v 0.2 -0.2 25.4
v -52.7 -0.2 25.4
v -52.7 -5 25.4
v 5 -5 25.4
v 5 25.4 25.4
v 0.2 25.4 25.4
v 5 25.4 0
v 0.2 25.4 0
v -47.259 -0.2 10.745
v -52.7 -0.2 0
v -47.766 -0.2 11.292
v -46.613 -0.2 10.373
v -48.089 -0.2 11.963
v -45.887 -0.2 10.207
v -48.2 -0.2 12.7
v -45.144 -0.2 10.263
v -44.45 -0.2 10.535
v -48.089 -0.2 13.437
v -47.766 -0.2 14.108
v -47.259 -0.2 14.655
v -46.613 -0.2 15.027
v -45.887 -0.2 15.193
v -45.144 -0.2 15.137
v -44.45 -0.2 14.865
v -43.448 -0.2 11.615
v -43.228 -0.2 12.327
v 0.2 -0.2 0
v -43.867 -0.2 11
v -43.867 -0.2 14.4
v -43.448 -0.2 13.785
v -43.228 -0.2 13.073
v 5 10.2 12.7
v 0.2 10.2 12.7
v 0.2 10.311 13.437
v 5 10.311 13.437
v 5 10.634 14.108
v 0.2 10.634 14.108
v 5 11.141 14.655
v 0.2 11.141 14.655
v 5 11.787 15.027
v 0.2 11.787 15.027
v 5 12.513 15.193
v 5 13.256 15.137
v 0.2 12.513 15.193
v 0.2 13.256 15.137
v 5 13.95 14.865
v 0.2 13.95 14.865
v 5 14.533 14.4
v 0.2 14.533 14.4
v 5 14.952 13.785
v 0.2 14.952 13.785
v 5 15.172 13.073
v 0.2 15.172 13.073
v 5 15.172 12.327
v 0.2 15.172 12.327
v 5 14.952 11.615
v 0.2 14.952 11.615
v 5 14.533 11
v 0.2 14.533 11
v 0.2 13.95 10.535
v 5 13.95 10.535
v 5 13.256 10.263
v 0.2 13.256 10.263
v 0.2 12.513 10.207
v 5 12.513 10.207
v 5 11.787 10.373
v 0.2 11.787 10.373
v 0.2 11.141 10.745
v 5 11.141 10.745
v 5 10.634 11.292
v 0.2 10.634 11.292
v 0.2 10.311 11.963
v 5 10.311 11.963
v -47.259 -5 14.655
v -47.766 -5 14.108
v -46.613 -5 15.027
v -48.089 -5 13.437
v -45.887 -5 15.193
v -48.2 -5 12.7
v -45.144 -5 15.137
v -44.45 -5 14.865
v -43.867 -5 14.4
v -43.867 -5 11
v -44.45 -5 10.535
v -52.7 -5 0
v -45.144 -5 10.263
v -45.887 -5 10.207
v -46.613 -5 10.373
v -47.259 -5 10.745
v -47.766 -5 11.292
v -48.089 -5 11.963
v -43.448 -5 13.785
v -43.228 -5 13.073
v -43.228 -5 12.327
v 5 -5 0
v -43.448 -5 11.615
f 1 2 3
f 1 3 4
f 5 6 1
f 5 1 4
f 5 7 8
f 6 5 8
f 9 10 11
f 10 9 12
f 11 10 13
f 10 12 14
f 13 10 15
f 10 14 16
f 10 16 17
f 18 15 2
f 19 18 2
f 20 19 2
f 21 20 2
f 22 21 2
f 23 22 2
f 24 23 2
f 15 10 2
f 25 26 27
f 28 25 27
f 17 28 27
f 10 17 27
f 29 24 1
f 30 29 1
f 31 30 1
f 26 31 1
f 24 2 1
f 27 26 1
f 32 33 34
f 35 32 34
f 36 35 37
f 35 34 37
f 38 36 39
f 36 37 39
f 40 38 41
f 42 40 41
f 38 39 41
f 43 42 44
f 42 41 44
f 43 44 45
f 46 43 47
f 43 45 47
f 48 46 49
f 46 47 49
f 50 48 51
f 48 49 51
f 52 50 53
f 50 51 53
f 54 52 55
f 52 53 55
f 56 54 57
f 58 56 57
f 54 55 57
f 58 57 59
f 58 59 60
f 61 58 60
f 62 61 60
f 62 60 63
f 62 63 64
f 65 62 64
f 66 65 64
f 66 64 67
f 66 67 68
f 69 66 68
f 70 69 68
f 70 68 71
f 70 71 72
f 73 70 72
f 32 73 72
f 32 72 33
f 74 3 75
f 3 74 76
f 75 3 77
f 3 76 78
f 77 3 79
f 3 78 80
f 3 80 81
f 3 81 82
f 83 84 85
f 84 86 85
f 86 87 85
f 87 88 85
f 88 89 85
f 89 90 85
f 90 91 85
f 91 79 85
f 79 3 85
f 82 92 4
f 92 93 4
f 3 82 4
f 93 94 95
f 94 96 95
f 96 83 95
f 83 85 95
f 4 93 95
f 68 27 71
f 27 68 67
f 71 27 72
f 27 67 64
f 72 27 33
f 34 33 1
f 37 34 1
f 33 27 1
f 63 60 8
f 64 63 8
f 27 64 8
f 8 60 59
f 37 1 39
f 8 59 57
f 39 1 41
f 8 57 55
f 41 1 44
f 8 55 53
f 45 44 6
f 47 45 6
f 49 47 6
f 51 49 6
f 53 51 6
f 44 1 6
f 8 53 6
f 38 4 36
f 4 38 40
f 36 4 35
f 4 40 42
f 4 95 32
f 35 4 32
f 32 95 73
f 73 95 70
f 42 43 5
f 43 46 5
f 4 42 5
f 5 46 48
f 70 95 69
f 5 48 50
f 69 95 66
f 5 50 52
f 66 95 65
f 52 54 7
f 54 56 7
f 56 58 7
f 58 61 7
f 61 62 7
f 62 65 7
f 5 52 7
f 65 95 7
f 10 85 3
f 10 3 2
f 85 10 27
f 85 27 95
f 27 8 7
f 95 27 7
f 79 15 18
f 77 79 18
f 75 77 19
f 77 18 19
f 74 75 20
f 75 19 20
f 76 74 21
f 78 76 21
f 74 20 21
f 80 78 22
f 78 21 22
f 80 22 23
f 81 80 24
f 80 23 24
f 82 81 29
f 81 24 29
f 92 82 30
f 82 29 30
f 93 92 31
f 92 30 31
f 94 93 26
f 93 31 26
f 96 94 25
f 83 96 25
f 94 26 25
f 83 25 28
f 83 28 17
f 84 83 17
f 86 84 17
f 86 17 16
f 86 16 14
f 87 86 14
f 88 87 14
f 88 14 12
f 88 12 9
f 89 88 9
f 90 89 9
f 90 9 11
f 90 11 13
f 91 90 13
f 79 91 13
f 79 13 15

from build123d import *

# Parameters (mm, degrees)
F0_W     = 27.3
F0_H     = 5
F1_DEPTH = 25.4
F2_R     = 2.5
F3_DEPTH = 5.001
F4_R     = 2.5
F5_DEPTH = 5.001
F6_W     = 52.7
F6_H     = 0.2
F7_DEPTH = 25.401


with BuildPart() as f1:
    # F0 (on Top) → F1 (new body)
    with BuildSketch(Plane.XY):
        Polygon((5, 25.4), (0, 25.4), (0, 0), (-25.4, 0), (-25.4, -5), (5, -5), (5, 0), align=None)
        with Locations((-39.05, -2.5)):
            Rectangle(F0_W, F0_H)
    extrude(amount=F1_DEPTH)

    # F2 (on face) → F3 (cut, through all)
    with BuildSketch(Plane(origin=(0, 0, 0), x_dir=(0, -1, 0), z_dir=(-1, 0, 0))):
        with Locations((-12.7, 12.7)):
            Circle(F2_R)
    extrude(amount=-F3_DEPTH, mode=Mode.SUBTRACT)

    # F4 (on face) → F5 (cut, through all)
    with BuildSketch(Plane(origin=(0, 0, 0), x_dir=(-1, 0, 0), z_dir=(0, 1, 0))):
        with Locations((45.7, 12.7)):
            Circle(F4_R)
    extrude(amount=-F5_DEPTH, mode=Mode.SUBTRACT)

    # F6 (on face) → F7 (cut, through all)
    with BuildSketch(Plane.XY.offset(25.4)):
        with Locations((-26.35, -0.1)):
            Rectangle(F6_W, F6_H)
        Polygon((0, 25.4), (0, 0), (0, -0.2), (0.2, -0.2), (0.2, 25.4), align=None)
    extrude(amount=-F7_DEPTH, mode=Mode.SUBTRACT)


solid = f1.part
